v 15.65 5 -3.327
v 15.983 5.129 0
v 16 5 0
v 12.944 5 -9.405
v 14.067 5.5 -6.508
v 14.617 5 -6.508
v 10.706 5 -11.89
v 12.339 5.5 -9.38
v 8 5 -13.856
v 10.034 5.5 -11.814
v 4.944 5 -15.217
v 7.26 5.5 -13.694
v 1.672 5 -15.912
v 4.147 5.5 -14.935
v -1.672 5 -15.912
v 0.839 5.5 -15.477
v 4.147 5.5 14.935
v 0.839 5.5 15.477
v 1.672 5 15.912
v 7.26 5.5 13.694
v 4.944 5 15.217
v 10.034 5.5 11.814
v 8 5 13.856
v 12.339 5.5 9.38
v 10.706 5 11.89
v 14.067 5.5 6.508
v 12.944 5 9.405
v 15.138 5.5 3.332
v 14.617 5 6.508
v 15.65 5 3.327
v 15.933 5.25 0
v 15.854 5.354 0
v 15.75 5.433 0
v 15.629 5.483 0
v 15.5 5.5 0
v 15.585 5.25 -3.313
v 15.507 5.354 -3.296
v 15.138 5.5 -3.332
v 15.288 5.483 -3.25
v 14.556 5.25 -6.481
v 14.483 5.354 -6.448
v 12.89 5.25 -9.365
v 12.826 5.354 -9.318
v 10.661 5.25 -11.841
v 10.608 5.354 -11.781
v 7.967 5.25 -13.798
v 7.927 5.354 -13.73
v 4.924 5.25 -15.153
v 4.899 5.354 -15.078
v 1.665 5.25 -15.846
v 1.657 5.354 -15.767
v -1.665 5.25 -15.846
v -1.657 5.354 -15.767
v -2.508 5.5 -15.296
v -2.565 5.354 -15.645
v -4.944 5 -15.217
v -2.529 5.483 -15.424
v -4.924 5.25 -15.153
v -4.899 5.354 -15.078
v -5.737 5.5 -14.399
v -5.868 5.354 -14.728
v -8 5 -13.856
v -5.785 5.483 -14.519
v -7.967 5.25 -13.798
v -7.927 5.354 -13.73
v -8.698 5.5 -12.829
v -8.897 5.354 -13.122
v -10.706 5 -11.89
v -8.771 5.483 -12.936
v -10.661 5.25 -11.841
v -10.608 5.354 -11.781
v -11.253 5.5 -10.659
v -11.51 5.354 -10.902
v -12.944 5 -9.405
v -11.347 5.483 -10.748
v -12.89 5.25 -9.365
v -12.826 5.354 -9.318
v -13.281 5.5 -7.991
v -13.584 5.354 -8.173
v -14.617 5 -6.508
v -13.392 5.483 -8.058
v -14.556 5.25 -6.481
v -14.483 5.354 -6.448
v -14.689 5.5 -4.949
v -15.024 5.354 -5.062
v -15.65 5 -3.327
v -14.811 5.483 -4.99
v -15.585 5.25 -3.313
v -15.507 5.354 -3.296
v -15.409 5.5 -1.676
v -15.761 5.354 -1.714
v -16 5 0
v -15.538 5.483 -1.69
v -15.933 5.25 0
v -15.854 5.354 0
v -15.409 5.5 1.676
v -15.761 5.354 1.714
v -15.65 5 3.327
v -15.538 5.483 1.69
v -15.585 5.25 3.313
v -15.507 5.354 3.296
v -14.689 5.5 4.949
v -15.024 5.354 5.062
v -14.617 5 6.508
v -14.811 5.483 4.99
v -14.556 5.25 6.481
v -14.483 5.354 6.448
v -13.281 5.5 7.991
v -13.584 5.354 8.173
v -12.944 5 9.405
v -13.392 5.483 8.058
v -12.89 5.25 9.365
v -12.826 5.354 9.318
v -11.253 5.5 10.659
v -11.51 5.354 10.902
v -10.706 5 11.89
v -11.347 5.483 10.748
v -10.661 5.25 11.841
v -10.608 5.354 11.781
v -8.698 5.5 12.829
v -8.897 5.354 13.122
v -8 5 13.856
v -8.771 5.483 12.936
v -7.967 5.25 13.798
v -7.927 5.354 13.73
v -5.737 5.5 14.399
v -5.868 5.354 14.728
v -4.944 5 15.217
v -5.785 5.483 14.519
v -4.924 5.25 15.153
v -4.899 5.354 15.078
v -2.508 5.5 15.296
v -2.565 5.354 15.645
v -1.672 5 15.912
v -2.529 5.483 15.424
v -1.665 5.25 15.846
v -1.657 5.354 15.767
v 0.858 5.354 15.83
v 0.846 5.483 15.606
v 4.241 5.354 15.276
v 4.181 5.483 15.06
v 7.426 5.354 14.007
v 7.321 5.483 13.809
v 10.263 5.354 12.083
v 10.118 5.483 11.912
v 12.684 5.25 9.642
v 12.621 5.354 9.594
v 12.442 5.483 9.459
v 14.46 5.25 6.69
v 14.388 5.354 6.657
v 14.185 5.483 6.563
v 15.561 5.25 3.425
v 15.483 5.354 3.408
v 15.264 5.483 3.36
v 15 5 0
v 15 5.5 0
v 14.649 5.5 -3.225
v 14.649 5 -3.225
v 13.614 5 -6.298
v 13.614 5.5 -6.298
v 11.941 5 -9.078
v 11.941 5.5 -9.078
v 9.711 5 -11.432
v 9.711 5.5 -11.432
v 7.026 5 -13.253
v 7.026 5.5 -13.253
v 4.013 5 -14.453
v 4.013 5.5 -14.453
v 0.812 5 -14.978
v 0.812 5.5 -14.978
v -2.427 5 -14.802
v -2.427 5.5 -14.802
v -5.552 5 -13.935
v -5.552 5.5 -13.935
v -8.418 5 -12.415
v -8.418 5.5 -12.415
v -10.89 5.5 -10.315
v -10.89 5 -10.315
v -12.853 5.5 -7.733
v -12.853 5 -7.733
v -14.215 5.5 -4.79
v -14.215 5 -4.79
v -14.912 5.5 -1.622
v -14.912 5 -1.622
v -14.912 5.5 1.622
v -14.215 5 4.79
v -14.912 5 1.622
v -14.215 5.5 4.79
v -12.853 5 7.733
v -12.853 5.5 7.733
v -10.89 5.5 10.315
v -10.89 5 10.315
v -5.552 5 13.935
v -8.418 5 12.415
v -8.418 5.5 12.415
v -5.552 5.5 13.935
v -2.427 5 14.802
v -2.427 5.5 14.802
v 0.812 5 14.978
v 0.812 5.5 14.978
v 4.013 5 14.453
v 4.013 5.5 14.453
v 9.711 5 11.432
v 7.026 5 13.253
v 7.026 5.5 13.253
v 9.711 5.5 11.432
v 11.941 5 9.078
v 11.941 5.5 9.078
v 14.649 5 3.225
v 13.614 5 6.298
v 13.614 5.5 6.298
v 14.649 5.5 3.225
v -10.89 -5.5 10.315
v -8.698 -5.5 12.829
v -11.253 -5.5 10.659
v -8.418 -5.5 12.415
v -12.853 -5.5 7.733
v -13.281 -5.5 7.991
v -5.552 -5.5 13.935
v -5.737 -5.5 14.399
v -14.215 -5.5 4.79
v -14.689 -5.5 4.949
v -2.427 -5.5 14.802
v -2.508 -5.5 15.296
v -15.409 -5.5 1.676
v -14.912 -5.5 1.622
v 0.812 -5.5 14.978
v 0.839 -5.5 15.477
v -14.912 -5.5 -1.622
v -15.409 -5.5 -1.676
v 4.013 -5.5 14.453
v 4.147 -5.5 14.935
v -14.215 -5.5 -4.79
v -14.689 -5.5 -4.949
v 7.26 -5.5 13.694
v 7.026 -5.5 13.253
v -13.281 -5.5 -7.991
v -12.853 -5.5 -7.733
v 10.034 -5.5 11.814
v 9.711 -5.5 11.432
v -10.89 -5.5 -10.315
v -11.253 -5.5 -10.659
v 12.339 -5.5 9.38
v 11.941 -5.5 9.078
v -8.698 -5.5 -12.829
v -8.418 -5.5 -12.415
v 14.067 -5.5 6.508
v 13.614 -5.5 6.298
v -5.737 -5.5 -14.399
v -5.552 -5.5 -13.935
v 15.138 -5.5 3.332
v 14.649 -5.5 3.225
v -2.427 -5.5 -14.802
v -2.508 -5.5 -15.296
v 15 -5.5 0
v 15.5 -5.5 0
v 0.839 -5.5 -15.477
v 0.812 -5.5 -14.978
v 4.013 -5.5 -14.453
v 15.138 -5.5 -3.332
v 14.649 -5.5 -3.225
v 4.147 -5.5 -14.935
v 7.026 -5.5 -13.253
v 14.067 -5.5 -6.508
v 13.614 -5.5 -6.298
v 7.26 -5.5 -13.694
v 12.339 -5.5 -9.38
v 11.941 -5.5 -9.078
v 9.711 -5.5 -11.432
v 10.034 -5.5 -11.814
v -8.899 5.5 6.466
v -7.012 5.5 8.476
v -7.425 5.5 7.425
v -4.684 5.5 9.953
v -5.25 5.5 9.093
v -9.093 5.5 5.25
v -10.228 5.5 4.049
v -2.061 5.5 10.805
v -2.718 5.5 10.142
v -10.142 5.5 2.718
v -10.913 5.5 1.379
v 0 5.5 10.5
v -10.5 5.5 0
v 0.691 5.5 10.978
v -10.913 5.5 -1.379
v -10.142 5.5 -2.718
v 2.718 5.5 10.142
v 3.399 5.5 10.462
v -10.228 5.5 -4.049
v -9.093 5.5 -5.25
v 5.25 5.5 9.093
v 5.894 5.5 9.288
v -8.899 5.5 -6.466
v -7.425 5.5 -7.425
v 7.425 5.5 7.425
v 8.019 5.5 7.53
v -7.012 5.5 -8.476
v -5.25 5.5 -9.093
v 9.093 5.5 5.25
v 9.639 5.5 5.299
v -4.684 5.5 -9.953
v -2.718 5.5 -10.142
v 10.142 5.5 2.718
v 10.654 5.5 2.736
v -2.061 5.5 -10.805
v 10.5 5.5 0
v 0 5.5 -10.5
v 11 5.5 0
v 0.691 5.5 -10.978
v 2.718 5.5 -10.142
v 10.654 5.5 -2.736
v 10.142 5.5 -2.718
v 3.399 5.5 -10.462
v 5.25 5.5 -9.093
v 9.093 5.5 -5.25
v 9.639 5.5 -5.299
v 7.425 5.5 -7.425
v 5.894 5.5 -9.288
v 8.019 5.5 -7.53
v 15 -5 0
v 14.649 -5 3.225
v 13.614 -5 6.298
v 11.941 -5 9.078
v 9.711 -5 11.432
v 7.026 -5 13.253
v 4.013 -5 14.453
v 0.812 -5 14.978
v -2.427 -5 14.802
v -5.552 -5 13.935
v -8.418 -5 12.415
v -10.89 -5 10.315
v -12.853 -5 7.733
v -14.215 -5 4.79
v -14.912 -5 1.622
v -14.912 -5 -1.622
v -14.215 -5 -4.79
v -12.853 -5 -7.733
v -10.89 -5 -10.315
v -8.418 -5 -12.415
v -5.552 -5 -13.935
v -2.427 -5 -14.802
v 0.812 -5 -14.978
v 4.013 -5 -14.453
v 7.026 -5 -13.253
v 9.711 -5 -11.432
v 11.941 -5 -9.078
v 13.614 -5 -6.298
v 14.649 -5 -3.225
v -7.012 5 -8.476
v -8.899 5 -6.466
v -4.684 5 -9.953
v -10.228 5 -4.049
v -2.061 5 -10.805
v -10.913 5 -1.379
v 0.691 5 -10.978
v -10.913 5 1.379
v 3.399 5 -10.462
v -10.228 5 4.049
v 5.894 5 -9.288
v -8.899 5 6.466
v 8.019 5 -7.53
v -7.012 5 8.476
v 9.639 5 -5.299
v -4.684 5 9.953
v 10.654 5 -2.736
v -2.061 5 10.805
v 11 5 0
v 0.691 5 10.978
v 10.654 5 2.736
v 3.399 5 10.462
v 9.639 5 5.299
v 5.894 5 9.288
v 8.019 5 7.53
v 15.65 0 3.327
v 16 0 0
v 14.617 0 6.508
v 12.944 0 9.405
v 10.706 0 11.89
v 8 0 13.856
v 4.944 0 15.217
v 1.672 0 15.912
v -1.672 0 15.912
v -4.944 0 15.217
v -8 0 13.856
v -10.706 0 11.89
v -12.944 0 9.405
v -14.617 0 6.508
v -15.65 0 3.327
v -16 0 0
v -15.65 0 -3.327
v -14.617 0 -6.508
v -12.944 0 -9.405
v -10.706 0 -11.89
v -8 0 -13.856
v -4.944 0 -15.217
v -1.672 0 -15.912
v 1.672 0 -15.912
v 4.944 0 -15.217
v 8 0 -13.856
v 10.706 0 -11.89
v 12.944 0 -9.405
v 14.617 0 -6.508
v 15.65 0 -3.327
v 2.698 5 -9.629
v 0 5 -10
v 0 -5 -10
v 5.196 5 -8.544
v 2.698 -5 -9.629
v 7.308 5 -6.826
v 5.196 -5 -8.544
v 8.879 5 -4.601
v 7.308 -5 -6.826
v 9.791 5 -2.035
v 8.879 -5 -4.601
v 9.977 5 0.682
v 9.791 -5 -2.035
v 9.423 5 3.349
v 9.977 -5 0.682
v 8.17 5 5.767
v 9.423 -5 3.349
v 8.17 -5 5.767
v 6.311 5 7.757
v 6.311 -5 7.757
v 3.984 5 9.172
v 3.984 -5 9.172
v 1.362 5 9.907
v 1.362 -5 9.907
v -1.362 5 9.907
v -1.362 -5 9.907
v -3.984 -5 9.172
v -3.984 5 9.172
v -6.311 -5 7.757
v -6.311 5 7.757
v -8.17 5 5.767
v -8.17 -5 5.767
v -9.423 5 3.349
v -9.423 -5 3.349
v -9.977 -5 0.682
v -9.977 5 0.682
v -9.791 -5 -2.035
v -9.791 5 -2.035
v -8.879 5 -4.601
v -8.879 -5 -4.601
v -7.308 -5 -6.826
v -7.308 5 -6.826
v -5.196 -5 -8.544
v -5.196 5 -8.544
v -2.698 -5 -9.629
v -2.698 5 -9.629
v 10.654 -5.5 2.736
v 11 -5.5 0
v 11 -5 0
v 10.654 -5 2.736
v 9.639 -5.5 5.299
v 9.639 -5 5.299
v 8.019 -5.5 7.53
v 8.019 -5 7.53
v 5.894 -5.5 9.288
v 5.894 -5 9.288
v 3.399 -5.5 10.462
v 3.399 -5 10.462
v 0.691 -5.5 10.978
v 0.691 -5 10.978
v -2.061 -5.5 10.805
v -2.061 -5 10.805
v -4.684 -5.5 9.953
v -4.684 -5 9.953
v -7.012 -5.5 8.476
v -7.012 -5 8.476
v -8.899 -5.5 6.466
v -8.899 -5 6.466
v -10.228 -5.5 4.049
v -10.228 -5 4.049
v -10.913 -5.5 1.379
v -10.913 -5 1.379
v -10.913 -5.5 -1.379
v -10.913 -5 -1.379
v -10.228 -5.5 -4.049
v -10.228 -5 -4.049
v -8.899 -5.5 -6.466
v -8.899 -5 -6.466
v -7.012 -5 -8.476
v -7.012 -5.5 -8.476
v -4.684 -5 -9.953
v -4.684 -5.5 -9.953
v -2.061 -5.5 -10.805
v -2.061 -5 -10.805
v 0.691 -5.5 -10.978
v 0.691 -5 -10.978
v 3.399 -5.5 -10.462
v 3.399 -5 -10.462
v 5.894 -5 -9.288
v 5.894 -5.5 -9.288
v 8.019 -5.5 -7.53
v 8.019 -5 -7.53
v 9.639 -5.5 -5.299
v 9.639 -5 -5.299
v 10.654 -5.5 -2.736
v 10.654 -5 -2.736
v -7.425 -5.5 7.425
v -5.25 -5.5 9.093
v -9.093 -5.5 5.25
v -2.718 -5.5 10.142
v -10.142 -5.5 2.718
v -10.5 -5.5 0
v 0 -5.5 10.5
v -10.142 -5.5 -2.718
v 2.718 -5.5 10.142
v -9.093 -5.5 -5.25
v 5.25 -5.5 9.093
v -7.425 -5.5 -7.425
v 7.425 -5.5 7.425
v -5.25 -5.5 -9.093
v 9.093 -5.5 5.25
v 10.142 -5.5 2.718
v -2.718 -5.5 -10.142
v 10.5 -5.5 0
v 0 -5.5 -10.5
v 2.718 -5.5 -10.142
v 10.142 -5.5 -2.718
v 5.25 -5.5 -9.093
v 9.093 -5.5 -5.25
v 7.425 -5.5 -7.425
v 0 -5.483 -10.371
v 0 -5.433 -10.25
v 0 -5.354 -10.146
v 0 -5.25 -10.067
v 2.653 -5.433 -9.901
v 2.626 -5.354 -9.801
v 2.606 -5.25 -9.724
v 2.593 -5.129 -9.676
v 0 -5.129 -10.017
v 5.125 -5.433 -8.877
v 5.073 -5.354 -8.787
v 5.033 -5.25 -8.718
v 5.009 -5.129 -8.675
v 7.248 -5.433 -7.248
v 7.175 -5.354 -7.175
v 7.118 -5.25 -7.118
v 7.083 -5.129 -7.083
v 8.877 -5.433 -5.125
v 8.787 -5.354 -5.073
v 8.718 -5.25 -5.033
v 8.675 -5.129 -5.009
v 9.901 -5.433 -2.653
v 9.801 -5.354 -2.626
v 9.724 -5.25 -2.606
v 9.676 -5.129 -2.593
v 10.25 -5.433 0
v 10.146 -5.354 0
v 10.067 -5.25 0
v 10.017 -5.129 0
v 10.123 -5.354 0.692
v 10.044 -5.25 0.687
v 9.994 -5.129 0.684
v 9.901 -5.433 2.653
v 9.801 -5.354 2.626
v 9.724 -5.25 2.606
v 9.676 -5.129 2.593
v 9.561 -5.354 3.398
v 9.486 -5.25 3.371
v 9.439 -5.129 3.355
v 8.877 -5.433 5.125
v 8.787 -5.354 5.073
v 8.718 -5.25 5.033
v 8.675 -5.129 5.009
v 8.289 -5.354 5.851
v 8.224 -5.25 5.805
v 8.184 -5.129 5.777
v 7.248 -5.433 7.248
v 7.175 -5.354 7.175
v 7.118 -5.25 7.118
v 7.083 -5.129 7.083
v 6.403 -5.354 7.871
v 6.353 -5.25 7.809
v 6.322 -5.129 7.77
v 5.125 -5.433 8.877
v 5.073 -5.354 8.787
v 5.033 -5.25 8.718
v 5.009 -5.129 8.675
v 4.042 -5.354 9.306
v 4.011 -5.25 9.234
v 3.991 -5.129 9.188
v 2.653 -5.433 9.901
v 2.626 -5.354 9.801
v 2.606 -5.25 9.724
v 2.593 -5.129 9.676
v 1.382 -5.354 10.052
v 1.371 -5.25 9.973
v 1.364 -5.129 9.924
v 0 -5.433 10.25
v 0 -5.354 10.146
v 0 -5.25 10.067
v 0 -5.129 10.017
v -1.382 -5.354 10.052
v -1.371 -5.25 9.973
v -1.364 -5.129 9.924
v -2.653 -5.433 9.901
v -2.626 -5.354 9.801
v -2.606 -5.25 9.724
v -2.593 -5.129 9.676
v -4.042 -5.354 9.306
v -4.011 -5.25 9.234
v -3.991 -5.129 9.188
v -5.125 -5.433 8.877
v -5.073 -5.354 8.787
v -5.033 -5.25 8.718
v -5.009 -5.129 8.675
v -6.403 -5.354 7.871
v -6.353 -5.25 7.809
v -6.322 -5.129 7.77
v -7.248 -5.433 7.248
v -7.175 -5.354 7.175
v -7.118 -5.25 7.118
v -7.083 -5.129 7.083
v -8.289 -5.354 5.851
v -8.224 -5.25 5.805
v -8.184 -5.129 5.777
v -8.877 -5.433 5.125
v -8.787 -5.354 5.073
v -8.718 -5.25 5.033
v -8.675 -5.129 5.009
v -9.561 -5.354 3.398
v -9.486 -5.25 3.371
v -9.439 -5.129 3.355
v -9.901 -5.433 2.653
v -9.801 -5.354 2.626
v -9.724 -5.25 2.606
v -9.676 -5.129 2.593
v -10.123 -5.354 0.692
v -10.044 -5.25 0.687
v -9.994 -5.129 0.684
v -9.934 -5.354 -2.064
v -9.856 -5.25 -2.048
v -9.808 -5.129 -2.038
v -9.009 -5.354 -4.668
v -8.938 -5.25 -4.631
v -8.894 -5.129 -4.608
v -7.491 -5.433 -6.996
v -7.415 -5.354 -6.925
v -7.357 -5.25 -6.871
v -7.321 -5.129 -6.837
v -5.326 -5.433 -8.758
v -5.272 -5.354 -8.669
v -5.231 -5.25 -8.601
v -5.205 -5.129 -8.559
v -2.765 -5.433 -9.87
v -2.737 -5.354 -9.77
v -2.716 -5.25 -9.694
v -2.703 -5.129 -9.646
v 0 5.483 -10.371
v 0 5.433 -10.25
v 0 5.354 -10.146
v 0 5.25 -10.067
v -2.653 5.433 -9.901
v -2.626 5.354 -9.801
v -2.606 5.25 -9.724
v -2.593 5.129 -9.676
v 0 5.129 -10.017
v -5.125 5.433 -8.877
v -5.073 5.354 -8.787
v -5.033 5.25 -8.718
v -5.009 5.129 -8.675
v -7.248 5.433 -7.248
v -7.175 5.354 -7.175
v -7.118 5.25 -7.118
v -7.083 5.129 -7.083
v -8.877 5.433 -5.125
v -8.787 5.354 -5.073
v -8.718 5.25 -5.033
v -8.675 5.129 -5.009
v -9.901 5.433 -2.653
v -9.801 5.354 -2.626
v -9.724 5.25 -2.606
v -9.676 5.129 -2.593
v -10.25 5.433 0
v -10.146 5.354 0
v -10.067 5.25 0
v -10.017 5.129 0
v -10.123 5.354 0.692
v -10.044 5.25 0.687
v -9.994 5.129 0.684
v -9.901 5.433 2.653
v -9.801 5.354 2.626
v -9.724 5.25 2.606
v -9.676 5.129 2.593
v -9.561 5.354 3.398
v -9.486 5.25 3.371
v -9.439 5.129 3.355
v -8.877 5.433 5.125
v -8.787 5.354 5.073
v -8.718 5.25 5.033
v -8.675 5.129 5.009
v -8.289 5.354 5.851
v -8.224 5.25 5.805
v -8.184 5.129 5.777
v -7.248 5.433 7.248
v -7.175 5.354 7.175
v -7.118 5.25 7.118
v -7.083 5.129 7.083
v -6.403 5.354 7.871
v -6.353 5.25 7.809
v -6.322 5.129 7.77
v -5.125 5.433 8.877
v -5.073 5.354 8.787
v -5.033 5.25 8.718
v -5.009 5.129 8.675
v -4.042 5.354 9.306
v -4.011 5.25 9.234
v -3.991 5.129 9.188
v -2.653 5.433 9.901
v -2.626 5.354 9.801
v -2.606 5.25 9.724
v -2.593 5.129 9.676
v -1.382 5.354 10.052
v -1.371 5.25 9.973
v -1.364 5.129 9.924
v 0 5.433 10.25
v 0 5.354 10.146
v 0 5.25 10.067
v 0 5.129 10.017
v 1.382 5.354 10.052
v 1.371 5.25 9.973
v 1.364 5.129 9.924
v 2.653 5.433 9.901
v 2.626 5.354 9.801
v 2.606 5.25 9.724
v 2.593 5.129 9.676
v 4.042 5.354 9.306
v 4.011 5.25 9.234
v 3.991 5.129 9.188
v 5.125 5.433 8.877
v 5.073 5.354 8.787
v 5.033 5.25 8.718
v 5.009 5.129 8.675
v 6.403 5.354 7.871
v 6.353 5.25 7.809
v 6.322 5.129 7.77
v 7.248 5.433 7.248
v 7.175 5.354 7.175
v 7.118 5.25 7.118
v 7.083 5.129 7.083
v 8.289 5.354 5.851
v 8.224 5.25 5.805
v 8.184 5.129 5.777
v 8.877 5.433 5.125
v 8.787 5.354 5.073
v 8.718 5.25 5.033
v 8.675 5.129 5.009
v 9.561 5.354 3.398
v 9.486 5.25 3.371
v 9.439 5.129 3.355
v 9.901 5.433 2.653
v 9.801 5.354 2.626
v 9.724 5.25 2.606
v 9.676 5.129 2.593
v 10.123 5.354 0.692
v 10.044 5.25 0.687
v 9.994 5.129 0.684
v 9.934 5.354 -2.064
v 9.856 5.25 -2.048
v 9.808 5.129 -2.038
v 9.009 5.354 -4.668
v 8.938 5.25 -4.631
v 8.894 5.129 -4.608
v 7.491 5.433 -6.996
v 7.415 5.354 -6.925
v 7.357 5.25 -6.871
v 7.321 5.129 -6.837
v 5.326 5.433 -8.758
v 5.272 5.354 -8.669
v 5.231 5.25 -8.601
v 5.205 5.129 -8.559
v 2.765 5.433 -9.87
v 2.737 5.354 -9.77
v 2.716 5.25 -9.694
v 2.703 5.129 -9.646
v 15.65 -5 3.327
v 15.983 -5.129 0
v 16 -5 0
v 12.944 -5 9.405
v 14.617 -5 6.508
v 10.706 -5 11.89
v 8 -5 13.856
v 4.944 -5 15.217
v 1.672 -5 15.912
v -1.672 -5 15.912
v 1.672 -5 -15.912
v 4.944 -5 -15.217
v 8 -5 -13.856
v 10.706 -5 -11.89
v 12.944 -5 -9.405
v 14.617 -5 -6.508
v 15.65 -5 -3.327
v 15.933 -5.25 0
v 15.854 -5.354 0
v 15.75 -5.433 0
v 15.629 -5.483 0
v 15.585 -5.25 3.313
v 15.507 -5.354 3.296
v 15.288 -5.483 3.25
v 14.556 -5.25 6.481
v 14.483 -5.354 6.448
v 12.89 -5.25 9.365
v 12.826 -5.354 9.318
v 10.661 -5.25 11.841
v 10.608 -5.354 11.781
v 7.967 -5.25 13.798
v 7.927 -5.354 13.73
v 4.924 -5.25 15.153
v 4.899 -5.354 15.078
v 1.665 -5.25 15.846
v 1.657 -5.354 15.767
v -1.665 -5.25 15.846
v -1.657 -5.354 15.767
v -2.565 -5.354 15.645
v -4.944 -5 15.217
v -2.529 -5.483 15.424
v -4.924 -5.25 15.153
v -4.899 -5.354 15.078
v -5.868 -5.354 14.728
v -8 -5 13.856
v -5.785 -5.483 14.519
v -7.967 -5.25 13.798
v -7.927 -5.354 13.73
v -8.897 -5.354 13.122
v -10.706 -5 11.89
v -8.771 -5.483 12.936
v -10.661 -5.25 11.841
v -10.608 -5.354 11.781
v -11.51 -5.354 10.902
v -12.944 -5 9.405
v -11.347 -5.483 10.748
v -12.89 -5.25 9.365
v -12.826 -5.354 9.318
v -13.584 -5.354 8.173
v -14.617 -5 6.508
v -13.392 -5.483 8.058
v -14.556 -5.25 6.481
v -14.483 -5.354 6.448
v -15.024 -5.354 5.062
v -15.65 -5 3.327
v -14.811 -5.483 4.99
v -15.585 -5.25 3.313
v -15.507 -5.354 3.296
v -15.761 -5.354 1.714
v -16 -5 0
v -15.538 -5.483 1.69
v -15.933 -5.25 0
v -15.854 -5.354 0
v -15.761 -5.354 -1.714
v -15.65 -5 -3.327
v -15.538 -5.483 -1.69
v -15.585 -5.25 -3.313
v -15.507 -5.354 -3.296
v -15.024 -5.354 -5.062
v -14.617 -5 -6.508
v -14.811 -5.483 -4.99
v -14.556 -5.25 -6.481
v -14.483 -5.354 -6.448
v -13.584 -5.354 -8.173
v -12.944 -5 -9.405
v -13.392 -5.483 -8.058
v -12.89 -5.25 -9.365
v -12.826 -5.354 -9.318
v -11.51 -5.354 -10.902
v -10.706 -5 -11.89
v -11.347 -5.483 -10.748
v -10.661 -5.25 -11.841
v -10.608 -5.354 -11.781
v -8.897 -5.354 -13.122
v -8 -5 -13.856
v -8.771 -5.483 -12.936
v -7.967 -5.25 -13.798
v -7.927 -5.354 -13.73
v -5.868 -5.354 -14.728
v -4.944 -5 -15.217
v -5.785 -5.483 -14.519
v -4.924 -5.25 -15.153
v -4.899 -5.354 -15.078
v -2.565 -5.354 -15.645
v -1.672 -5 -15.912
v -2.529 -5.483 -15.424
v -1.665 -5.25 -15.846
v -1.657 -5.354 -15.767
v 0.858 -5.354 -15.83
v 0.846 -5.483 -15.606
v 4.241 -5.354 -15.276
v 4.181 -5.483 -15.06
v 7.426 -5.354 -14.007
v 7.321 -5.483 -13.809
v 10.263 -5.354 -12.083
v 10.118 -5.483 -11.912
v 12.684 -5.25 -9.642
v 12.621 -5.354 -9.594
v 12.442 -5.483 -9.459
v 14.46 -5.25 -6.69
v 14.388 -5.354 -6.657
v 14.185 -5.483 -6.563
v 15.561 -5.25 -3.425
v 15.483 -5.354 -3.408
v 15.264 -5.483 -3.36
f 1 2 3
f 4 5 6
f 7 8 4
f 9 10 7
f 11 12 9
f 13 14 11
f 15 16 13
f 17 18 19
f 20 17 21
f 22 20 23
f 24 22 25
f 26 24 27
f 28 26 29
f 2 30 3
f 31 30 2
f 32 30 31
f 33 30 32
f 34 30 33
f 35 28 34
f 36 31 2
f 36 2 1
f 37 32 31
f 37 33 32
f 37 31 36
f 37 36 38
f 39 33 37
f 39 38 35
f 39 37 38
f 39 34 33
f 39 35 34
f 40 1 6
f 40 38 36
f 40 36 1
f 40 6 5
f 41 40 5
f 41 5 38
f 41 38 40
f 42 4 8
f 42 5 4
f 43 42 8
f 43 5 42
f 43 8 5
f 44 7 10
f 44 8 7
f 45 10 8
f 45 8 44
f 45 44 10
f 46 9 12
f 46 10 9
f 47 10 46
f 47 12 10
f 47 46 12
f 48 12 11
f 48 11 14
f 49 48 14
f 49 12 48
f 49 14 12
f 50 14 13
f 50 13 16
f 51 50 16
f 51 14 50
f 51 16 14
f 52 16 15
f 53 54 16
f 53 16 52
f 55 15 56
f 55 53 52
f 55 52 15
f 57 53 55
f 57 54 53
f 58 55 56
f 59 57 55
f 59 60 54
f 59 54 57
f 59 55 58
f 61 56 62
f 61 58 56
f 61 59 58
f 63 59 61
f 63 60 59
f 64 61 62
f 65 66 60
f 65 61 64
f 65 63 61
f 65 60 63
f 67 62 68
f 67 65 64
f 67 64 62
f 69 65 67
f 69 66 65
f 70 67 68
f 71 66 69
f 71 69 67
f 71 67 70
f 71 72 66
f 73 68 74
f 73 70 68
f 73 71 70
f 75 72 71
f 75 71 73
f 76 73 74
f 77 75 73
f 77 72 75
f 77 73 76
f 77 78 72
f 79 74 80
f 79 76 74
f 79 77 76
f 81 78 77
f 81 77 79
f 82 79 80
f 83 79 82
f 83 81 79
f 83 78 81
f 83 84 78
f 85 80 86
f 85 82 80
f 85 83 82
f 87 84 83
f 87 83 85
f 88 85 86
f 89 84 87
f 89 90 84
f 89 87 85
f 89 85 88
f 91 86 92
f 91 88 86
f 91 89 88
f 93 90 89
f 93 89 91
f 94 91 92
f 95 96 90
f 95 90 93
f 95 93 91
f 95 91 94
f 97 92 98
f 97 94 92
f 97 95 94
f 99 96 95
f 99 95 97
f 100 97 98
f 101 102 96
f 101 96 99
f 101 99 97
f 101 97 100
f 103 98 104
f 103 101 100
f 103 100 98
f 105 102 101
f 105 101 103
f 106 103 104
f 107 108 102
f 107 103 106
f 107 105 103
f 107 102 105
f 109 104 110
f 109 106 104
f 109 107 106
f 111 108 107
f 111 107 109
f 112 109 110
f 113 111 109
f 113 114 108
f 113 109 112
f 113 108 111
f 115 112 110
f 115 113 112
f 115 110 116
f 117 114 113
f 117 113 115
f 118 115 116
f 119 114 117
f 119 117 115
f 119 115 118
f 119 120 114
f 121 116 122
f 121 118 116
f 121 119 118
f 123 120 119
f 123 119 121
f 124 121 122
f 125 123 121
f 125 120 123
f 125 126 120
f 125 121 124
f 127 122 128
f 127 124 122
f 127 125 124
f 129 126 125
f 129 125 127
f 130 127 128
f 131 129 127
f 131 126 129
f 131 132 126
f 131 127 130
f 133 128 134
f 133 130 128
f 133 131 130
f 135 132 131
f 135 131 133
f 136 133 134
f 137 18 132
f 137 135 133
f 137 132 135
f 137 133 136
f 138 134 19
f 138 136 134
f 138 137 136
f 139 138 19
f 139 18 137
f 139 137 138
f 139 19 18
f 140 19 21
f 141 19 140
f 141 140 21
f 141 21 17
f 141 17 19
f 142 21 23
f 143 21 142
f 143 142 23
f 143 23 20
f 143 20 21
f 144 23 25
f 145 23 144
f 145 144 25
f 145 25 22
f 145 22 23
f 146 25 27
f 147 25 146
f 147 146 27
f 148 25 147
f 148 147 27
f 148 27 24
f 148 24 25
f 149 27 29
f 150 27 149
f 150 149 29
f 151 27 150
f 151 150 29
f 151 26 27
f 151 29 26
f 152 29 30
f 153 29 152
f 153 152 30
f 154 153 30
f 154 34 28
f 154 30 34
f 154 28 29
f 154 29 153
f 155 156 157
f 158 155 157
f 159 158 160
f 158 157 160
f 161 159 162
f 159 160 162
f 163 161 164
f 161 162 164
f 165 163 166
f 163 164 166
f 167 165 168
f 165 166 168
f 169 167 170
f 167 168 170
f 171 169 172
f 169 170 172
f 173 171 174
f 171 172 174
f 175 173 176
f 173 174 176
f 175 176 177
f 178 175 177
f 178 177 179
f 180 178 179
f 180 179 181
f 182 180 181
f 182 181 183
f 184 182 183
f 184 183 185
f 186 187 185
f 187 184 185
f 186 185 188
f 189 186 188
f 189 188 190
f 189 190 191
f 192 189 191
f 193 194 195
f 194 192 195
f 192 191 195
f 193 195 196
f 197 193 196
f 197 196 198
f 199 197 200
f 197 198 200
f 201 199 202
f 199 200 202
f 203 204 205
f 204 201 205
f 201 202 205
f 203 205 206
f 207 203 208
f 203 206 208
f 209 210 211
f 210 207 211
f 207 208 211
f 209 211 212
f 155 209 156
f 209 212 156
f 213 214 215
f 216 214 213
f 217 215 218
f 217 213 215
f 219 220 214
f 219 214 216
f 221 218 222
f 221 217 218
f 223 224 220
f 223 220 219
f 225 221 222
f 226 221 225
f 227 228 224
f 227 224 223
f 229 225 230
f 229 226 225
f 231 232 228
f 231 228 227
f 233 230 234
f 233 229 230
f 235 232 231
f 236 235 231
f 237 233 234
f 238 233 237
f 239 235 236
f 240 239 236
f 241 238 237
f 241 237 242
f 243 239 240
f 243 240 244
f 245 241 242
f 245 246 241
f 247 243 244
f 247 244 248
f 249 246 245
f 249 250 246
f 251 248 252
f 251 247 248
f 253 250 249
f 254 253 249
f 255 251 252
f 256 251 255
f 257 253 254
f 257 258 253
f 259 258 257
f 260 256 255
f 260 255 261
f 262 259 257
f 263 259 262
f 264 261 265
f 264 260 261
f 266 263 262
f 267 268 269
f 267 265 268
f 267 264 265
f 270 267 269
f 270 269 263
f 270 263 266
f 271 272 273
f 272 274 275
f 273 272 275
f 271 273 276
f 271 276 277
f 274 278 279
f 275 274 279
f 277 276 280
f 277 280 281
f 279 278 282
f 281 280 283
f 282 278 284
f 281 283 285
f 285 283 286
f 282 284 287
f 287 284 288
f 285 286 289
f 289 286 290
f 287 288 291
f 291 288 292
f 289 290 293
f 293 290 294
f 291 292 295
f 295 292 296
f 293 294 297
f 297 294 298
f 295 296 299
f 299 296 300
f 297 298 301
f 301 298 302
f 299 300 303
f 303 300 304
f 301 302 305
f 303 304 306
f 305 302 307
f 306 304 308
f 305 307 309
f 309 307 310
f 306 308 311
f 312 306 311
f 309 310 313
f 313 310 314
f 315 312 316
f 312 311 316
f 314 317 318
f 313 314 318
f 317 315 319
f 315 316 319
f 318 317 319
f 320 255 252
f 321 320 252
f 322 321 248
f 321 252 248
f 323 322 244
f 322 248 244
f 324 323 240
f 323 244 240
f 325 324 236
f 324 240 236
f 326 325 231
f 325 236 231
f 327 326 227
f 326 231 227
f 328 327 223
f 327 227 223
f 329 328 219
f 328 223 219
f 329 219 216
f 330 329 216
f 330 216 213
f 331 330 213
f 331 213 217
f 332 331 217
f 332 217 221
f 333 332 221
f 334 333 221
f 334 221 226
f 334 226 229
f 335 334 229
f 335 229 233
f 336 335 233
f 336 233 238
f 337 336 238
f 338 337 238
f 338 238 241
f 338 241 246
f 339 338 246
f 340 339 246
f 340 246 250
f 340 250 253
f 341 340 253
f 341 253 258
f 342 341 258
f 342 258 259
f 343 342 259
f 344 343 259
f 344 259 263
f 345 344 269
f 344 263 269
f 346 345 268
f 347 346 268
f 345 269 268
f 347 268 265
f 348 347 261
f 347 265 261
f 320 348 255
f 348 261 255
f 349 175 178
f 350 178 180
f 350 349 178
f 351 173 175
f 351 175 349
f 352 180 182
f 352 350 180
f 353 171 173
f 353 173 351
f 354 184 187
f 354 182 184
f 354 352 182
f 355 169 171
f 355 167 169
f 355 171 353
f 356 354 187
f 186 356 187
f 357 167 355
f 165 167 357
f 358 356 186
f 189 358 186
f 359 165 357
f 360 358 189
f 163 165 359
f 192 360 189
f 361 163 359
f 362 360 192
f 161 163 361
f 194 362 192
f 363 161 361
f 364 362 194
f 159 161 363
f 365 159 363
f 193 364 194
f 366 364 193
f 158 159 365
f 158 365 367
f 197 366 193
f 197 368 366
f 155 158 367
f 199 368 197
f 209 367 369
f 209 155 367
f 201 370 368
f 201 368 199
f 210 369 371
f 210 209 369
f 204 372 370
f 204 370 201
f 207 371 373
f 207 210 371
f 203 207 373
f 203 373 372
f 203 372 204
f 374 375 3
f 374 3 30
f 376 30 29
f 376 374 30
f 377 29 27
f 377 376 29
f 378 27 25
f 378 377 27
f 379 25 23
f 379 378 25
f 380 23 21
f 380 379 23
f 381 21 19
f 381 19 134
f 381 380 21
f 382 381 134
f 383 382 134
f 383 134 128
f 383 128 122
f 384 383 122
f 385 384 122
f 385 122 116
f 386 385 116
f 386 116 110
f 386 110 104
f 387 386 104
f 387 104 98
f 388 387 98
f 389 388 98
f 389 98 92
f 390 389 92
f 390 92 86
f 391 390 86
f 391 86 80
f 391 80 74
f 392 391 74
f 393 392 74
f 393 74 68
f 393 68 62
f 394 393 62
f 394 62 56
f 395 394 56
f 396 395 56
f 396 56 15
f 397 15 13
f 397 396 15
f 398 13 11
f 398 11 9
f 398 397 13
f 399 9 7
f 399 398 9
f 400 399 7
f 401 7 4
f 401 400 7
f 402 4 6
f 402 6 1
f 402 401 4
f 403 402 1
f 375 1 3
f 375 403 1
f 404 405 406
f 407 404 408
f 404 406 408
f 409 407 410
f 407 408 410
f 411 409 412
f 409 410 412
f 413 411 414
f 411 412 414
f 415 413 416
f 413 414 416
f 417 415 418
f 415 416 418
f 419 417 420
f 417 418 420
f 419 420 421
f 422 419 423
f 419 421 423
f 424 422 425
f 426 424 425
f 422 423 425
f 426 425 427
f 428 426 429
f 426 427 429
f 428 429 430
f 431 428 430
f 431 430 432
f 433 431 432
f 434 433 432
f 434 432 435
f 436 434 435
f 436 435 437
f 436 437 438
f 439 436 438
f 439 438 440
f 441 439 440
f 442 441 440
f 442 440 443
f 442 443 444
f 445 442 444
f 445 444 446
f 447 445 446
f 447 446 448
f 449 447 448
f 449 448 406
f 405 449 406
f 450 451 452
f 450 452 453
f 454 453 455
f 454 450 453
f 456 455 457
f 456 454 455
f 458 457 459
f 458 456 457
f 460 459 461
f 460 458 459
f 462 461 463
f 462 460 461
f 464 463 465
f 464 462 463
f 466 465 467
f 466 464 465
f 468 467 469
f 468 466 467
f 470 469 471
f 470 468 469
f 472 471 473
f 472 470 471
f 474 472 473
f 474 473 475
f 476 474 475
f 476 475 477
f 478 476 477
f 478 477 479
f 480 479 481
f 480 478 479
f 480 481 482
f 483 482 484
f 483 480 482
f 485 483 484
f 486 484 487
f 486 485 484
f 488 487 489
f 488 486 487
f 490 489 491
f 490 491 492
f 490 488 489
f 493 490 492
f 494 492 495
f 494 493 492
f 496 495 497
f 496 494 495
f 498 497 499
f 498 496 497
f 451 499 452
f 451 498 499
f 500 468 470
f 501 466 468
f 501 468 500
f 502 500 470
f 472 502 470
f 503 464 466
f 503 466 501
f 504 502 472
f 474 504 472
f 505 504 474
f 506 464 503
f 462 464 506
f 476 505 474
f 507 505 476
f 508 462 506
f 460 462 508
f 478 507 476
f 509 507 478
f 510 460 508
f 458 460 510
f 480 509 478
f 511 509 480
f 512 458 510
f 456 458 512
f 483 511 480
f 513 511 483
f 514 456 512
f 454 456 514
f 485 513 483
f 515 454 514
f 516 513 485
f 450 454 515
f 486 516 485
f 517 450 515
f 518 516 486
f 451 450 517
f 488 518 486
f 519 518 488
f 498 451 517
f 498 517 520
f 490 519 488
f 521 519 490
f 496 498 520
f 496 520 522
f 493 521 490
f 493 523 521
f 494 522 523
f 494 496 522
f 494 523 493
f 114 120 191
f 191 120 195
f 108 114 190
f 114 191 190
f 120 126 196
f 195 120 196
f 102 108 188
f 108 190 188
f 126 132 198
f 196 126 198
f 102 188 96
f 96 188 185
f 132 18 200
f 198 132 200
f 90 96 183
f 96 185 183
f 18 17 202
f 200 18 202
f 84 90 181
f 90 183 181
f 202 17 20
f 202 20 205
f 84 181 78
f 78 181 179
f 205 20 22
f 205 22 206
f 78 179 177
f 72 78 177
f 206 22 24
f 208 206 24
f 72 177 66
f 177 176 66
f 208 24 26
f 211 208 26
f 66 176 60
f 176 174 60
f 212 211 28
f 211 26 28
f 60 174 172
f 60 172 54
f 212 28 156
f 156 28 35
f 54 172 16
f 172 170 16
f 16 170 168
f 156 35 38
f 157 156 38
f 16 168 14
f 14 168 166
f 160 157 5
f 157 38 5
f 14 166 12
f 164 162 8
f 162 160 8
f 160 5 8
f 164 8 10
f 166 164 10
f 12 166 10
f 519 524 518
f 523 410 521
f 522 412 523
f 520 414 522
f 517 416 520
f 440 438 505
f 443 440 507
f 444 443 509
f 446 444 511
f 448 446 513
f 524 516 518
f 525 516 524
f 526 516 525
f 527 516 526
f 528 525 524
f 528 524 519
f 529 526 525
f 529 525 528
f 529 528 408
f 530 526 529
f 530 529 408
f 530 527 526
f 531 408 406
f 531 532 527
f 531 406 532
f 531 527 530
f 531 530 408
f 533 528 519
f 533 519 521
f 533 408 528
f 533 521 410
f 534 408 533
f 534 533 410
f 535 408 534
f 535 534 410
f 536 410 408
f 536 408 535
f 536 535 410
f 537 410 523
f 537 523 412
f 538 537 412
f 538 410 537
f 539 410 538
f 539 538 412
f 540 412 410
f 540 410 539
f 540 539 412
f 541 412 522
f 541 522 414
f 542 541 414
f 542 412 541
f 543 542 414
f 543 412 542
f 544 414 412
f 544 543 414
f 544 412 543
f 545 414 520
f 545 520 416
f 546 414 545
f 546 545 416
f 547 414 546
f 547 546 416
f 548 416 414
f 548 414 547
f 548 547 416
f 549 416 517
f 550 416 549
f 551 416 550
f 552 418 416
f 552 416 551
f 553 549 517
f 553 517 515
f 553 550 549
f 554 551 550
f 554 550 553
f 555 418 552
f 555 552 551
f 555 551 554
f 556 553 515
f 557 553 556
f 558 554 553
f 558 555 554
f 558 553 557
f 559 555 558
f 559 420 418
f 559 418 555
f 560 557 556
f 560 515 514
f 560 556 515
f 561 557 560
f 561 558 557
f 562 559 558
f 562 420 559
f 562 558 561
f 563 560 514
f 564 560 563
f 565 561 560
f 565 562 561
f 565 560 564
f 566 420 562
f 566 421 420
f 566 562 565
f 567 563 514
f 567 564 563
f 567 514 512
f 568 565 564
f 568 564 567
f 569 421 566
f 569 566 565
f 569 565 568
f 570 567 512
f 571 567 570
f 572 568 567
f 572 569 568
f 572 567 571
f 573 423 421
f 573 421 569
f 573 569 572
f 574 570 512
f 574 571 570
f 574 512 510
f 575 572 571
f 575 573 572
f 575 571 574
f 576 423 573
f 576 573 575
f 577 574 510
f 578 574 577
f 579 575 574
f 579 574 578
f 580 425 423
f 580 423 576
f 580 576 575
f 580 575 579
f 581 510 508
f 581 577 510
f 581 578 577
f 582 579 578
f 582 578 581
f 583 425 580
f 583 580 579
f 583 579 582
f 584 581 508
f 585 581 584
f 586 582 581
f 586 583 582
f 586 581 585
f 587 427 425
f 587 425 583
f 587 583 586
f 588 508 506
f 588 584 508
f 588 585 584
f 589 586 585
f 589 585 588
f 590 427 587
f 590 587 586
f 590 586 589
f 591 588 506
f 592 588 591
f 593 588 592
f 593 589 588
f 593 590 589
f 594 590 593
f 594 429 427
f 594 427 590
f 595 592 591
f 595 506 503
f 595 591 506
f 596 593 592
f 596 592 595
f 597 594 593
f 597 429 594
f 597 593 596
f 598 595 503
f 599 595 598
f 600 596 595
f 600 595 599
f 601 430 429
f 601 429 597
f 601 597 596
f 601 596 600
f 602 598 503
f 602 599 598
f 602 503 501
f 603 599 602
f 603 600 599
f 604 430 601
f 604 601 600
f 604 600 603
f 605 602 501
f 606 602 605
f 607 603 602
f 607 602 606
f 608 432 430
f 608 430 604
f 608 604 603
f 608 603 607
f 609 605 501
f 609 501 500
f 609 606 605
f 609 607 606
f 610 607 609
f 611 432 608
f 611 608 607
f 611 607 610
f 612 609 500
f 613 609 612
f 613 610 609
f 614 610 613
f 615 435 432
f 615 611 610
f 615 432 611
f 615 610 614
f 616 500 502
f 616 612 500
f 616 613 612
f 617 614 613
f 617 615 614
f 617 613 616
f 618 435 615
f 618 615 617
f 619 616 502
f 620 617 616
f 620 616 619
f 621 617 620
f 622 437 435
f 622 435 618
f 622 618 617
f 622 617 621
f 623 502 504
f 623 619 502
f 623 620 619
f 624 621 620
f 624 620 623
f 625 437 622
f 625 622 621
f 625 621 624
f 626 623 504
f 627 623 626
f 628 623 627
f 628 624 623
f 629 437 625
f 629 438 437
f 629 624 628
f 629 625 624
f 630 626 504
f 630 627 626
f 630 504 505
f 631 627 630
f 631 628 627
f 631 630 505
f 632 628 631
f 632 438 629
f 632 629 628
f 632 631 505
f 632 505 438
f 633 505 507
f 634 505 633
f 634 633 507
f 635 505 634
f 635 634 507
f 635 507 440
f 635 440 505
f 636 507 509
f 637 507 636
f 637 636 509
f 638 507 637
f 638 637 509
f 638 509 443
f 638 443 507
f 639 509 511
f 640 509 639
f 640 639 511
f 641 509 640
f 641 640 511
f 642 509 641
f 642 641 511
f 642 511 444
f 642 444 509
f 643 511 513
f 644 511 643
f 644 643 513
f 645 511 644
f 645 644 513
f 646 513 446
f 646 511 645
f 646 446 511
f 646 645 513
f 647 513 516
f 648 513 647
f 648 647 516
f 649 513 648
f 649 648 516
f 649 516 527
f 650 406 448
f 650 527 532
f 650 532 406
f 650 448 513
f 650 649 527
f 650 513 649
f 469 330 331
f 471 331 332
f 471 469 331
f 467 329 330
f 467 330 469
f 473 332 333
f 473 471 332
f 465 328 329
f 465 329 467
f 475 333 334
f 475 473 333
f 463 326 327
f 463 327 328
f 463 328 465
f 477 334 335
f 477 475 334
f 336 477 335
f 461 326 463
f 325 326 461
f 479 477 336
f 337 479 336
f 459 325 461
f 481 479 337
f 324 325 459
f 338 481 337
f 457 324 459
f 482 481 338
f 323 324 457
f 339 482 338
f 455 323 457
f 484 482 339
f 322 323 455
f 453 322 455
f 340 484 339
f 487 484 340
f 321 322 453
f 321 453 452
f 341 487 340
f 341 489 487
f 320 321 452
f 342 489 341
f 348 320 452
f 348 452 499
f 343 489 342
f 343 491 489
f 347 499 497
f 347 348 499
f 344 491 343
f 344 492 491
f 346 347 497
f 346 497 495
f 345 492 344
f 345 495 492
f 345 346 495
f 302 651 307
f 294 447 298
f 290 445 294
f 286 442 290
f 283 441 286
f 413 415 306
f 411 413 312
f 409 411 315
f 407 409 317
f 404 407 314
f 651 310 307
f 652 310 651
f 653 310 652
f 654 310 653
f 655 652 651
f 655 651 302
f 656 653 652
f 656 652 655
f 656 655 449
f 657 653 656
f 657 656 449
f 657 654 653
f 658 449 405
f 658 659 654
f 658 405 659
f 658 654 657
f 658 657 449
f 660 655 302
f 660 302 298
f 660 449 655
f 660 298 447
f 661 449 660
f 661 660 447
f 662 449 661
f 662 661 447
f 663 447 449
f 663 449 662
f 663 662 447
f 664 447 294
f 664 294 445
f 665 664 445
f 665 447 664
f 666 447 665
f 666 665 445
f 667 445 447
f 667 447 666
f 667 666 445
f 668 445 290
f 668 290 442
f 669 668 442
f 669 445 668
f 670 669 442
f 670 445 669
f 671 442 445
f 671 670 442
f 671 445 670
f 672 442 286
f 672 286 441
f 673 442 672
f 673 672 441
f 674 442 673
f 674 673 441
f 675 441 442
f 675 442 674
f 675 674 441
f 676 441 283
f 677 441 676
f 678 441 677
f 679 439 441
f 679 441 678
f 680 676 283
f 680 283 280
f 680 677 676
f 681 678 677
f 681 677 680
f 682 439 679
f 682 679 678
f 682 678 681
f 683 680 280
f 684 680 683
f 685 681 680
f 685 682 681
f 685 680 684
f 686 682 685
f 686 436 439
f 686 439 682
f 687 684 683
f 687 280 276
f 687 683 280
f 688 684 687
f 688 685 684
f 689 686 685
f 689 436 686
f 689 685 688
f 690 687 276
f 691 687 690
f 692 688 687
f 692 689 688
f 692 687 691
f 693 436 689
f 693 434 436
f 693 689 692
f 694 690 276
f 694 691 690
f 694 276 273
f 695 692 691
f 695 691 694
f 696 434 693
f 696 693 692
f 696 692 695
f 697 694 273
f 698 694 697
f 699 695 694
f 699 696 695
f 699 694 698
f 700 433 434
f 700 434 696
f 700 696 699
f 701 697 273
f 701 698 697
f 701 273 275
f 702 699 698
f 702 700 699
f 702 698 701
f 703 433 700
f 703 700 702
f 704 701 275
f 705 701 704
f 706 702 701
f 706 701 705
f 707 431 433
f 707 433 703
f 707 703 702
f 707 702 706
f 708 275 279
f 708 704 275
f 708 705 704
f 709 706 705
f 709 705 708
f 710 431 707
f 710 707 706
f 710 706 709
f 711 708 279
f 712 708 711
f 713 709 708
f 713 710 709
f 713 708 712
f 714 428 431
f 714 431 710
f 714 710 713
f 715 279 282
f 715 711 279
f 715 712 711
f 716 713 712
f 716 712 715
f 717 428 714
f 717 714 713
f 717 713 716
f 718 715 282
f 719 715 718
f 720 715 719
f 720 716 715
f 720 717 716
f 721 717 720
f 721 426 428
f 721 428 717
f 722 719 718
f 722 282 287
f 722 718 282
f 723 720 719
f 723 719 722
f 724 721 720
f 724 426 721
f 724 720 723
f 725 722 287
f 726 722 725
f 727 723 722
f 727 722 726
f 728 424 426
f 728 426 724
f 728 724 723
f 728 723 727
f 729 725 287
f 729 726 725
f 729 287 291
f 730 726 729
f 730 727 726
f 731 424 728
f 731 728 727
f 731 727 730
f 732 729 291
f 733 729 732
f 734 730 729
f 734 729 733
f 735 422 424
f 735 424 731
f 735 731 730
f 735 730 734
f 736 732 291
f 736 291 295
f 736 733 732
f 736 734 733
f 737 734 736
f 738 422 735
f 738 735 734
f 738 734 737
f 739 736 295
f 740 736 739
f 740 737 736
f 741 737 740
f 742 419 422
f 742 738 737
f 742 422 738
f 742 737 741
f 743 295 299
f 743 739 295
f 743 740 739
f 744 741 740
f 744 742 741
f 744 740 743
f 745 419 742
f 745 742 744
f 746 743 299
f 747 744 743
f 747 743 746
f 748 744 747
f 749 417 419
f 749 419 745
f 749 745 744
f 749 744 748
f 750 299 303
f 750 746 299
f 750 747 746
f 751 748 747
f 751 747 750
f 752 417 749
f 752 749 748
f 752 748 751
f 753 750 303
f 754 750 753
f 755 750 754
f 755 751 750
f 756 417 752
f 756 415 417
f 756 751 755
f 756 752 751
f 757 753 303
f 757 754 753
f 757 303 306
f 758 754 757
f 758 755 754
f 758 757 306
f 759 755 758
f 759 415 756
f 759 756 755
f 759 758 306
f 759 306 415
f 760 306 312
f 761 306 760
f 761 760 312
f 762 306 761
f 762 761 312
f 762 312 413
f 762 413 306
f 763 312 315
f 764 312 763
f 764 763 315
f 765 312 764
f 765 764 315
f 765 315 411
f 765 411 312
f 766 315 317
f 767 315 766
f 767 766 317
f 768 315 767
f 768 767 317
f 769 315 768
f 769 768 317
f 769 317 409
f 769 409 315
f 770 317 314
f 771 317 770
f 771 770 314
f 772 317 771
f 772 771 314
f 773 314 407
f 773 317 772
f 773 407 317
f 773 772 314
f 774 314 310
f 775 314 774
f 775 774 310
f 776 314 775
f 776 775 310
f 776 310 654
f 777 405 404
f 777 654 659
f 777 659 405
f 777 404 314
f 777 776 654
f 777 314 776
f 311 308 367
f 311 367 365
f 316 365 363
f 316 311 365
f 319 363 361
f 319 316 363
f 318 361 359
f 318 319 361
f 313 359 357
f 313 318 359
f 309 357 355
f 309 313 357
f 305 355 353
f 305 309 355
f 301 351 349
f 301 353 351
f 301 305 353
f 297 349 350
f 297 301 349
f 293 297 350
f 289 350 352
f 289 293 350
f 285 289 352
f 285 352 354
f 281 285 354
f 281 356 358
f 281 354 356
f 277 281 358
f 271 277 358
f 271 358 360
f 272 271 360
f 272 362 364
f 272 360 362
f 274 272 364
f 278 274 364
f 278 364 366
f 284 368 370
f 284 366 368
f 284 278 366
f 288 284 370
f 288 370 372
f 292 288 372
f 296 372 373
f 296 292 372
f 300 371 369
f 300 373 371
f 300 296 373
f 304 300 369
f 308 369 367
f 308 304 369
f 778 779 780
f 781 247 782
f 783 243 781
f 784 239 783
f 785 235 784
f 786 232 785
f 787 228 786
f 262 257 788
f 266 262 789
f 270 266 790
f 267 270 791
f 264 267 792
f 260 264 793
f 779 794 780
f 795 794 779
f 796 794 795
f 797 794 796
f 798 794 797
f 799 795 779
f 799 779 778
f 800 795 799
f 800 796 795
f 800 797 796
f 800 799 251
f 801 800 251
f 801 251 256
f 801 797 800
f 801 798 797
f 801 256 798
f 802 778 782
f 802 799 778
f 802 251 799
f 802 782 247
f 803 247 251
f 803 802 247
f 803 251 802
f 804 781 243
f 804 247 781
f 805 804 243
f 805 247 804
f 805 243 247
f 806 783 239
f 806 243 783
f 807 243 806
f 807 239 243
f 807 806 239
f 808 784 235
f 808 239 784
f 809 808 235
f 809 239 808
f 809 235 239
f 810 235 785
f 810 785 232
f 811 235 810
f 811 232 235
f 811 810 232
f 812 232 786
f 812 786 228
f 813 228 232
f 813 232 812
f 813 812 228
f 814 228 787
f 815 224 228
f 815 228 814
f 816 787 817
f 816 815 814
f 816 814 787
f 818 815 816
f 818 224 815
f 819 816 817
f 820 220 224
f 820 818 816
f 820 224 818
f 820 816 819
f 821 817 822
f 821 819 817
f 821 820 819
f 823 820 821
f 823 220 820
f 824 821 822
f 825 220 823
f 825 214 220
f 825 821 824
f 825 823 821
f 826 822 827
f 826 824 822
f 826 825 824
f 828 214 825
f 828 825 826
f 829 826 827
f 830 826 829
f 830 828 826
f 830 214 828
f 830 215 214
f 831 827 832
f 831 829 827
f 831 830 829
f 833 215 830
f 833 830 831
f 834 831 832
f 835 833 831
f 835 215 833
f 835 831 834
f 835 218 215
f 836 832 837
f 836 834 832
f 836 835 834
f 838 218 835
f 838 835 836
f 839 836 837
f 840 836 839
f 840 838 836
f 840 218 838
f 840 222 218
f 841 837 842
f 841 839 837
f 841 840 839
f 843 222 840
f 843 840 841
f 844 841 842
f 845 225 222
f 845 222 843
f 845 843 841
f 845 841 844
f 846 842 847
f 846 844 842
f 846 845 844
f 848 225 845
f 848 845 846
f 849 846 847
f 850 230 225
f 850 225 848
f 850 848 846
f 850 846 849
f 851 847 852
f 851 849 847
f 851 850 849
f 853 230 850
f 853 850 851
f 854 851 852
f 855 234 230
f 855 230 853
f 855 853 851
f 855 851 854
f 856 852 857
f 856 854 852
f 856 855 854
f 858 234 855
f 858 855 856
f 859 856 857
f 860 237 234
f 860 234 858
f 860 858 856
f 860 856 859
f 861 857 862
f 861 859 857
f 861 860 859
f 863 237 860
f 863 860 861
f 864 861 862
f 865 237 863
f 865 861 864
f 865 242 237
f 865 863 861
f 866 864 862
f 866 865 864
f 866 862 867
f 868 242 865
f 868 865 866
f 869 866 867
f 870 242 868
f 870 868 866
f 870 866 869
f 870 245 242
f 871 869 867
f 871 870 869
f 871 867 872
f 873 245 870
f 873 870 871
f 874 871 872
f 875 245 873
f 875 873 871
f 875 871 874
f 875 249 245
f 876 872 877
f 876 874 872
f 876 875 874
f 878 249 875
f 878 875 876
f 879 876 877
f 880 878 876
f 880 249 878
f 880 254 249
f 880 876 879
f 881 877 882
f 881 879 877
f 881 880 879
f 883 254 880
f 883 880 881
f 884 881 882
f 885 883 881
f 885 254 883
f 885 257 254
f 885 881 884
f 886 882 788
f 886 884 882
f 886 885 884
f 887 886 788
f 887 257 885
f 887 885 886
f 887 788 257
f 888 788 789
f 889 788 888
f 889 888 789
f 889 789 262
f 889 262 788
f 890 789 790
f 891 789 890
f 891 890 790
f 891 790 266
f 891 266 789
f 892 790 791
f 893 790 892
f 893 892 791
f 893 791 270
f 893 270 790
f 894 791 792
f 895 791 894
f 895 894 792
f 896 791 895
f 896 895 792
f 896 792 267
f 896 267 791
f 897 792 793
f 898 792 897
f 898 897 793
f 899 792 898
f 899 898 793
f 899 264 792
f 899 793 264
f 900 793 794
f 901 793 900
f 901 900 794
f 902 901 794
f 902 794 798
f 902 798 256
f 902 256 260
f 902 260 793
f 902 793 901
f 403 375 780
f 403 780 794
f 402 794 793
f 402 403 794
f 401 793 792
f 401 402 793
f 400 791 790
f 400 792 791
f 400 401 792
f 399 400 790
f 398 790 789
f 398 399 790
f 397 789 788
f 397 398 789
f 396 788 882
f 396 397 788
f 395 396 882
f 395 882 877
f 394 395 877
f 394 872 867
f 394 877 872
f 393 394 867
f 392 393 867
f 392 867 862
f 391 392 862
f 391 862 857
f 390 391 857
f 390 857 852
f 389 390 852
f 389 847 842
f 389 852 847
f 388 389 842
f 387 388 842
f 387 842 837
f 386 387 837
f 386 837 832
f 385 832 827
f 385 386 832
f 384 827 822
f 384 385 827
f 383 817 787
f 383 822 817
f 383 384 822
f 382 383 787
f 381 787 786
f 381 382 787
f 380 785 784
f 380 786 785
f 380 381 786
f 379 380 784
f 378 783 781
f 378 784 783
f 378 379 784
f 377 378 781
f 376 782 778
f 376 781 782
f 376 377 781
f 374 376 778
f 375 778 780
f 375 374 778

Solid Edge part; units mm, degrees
sketch "Sketch1" plane through (0, 0, 0) normal (0, -1, 0) x (1, 0, 0)
  circle A0 centre (0, 0) radius 16
extrude "Protrusion1" add sketch "Sketch1" along normal mid plane 11
hole "Bohrung_1" at (0, -5.5, 0) direction (0, 1, 0) diameter 20 end up to next
fillet "Verrundung_1" radius 0.5 4 edges at (-16, -5.5, 0) (-16, 5.5, 0) (-10, -5.5, 0) (0, 5.5, -10)
sketch "Sketch2" plane through (0, -5.5, 0) normal (0, -1, 0) x (1, 0, 0)
  circle A0 centre (0, 0) radius 11
  circle A1 centre (0, 0) radius 15
extrude "Extrusionsausschnitt_1" cut sketch "Sketch2" along normal mid plane 1
mirror "Mirror1" about plane through (0, 0, 0) normal (0, -1, 0) of "Extrusionsausschnitt_1"
properties material "Aluminium, 1060"
